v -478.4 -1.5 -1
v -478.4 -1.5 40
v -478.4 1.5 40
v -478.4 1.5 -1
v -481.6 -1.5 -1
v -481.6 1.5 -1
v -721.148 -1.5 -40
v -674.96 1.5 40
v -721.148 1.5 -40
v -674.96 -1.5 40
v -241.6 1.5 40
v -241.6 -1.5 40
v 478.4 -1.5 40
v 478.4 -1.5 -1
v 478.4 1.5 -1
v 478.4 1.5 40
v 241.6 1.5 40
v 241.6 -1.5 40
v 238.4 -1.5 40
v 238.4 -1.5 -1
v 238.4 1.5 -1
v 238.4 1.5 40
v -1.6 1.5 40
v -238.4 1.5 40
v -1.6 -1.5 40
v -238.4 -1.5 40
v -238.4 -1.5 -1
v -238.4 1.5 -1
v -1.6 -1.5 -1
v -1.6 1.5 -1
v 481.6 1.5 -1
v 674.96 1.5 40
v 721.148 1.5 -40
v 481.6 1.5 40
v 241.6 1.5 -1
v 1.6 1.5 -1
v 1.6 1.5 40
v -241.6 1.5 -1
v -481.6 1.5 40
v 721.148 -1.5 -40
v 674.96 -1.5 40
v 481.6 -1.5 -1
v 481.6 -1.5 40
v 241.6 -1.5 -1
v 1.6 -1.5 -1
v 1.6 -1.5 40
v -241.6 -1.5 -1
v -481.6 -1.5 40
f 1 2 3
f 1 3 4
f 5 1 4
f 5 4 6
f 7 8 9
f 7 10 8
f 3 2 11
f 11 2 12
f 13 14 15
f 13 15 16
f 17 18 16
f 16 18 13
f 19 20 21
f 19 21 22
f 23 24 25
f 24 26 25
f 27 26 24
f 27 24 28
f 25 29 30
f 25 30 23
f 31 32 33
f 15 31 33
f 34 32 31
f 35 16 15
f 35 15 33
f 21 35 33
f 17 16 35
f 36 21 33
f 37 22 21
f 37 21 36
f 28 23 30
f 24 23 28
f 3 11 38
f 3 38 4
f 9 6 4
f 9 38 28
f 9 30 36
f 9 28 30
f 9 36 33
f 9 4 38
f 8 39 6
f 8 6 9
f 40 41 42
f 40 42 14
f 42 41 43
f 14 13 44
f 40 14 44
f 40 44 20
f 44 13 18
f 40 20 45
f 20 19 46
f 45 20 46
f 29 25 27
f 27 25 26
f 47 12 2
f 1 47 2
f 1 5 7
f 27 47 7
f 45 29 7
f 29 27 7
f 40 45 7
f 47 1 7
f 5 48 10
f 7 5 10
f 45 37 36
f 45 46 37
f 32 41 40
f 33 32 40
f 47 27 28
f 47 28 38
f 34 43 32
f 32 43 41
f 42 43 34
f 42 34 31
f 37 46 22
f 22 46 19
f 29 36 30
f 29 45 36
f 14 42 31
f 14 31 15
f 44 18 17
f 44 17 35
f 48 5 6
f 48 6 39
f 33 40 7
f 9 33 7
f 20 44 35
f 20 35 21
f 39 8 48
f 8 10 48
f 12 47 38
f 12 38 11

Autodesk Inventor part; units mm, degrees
ref_plane "YZ Plane" through (0, 0, 0) normal (1, 0, 0) x (0, 1, 0)
ref_plane "XZ Plane" through (0, 0, 0) normal (0, 1, 0) x (-1, 0, 0)
ref_plane "XY Plane" through (0, 0, 0) normal (0, 0, 1) x (1, 0, 0)
sketch "Sketch1" plane through (0, 0, 0) normal (0, 1, 0) x (-1, 0, 0)
  line L0 (900, 40) -> (-900, 40)
  line L1 (-900, 40) -> (-900, -40)
  line L2 (-900, -40) -> (900, -40)
  line L3 (900, -40) -> (900, 40)
  line L4 (900, 40) -> (-900, -40) construction
  line L5 (674.96, 40) -> (721.148, -40)
  line L6 (0, 40) -> (0, -40) construction
  line L7 (-674.96, 40) -> (-721.148, -40)
  point P0 (0, 0)
  point P1 (0, 0)
  dimension "d0" = 80
  dimension "d1" = 1800
  dimension "d3" = 120
  dimension "d6" = 674.96
  dimension "d7" = 120
  dimension "d8" = 674.96
extrude "Plate1" add sketch "Sketch1" along normal mid plane 3 contours L5 L2 L7 L0
sketch "Sketch2" plane through (0, -1.5, 0) normal (0, -1, 0) x (1, 0, 0)
  line L0 (-1.6, 40) -> (1.6, 40)
  line L1 (1.6, 40) -> (1.6, -1)
  line L2 (1.6, -1) -> (-1.6, -1)
  line L3 (-1.6, -1) -> (-1.6, 40)
  line L4 (-674.96, 40) -> (674.96, 40) projected
  point P0 (0, 0)
  point P1 (0, 40)
  dimension "d9" = 3.2
  dimension "d10" = 41
extrude "Extrusion1" cut sketch "Sketch2" against normal through all
pattern_linear "Rectangular Pattern1" count 5 spacing 240 along (1, 0, 0) of "Extrusion1" first direction both ways yes
equation "\"d7\" = d3"
equation "\"d8\" = d6"
equation "\"d2\" = Thickness"
equation "\"BendReliefWidth\" = Thickness"
equation "\"BendReliefDepth\" = 0.5 * Thickness"
equation "\"CornerReliefSize\" = 4 * Thickness"
equation "\"MinimumRemnant\" = 2 * Thickness"
equation "\"TransitionRadius\" = BendRadius"
equation "\"JacobiRadiusSize\" = BendRadius"
equation "\"GapSize\" = Thickness"
equation "\"Thickness\" = 3"
equation "\"BendRadius\" = 5"
properties part number "MSC 203 GRID" material "Stainless Steel"
